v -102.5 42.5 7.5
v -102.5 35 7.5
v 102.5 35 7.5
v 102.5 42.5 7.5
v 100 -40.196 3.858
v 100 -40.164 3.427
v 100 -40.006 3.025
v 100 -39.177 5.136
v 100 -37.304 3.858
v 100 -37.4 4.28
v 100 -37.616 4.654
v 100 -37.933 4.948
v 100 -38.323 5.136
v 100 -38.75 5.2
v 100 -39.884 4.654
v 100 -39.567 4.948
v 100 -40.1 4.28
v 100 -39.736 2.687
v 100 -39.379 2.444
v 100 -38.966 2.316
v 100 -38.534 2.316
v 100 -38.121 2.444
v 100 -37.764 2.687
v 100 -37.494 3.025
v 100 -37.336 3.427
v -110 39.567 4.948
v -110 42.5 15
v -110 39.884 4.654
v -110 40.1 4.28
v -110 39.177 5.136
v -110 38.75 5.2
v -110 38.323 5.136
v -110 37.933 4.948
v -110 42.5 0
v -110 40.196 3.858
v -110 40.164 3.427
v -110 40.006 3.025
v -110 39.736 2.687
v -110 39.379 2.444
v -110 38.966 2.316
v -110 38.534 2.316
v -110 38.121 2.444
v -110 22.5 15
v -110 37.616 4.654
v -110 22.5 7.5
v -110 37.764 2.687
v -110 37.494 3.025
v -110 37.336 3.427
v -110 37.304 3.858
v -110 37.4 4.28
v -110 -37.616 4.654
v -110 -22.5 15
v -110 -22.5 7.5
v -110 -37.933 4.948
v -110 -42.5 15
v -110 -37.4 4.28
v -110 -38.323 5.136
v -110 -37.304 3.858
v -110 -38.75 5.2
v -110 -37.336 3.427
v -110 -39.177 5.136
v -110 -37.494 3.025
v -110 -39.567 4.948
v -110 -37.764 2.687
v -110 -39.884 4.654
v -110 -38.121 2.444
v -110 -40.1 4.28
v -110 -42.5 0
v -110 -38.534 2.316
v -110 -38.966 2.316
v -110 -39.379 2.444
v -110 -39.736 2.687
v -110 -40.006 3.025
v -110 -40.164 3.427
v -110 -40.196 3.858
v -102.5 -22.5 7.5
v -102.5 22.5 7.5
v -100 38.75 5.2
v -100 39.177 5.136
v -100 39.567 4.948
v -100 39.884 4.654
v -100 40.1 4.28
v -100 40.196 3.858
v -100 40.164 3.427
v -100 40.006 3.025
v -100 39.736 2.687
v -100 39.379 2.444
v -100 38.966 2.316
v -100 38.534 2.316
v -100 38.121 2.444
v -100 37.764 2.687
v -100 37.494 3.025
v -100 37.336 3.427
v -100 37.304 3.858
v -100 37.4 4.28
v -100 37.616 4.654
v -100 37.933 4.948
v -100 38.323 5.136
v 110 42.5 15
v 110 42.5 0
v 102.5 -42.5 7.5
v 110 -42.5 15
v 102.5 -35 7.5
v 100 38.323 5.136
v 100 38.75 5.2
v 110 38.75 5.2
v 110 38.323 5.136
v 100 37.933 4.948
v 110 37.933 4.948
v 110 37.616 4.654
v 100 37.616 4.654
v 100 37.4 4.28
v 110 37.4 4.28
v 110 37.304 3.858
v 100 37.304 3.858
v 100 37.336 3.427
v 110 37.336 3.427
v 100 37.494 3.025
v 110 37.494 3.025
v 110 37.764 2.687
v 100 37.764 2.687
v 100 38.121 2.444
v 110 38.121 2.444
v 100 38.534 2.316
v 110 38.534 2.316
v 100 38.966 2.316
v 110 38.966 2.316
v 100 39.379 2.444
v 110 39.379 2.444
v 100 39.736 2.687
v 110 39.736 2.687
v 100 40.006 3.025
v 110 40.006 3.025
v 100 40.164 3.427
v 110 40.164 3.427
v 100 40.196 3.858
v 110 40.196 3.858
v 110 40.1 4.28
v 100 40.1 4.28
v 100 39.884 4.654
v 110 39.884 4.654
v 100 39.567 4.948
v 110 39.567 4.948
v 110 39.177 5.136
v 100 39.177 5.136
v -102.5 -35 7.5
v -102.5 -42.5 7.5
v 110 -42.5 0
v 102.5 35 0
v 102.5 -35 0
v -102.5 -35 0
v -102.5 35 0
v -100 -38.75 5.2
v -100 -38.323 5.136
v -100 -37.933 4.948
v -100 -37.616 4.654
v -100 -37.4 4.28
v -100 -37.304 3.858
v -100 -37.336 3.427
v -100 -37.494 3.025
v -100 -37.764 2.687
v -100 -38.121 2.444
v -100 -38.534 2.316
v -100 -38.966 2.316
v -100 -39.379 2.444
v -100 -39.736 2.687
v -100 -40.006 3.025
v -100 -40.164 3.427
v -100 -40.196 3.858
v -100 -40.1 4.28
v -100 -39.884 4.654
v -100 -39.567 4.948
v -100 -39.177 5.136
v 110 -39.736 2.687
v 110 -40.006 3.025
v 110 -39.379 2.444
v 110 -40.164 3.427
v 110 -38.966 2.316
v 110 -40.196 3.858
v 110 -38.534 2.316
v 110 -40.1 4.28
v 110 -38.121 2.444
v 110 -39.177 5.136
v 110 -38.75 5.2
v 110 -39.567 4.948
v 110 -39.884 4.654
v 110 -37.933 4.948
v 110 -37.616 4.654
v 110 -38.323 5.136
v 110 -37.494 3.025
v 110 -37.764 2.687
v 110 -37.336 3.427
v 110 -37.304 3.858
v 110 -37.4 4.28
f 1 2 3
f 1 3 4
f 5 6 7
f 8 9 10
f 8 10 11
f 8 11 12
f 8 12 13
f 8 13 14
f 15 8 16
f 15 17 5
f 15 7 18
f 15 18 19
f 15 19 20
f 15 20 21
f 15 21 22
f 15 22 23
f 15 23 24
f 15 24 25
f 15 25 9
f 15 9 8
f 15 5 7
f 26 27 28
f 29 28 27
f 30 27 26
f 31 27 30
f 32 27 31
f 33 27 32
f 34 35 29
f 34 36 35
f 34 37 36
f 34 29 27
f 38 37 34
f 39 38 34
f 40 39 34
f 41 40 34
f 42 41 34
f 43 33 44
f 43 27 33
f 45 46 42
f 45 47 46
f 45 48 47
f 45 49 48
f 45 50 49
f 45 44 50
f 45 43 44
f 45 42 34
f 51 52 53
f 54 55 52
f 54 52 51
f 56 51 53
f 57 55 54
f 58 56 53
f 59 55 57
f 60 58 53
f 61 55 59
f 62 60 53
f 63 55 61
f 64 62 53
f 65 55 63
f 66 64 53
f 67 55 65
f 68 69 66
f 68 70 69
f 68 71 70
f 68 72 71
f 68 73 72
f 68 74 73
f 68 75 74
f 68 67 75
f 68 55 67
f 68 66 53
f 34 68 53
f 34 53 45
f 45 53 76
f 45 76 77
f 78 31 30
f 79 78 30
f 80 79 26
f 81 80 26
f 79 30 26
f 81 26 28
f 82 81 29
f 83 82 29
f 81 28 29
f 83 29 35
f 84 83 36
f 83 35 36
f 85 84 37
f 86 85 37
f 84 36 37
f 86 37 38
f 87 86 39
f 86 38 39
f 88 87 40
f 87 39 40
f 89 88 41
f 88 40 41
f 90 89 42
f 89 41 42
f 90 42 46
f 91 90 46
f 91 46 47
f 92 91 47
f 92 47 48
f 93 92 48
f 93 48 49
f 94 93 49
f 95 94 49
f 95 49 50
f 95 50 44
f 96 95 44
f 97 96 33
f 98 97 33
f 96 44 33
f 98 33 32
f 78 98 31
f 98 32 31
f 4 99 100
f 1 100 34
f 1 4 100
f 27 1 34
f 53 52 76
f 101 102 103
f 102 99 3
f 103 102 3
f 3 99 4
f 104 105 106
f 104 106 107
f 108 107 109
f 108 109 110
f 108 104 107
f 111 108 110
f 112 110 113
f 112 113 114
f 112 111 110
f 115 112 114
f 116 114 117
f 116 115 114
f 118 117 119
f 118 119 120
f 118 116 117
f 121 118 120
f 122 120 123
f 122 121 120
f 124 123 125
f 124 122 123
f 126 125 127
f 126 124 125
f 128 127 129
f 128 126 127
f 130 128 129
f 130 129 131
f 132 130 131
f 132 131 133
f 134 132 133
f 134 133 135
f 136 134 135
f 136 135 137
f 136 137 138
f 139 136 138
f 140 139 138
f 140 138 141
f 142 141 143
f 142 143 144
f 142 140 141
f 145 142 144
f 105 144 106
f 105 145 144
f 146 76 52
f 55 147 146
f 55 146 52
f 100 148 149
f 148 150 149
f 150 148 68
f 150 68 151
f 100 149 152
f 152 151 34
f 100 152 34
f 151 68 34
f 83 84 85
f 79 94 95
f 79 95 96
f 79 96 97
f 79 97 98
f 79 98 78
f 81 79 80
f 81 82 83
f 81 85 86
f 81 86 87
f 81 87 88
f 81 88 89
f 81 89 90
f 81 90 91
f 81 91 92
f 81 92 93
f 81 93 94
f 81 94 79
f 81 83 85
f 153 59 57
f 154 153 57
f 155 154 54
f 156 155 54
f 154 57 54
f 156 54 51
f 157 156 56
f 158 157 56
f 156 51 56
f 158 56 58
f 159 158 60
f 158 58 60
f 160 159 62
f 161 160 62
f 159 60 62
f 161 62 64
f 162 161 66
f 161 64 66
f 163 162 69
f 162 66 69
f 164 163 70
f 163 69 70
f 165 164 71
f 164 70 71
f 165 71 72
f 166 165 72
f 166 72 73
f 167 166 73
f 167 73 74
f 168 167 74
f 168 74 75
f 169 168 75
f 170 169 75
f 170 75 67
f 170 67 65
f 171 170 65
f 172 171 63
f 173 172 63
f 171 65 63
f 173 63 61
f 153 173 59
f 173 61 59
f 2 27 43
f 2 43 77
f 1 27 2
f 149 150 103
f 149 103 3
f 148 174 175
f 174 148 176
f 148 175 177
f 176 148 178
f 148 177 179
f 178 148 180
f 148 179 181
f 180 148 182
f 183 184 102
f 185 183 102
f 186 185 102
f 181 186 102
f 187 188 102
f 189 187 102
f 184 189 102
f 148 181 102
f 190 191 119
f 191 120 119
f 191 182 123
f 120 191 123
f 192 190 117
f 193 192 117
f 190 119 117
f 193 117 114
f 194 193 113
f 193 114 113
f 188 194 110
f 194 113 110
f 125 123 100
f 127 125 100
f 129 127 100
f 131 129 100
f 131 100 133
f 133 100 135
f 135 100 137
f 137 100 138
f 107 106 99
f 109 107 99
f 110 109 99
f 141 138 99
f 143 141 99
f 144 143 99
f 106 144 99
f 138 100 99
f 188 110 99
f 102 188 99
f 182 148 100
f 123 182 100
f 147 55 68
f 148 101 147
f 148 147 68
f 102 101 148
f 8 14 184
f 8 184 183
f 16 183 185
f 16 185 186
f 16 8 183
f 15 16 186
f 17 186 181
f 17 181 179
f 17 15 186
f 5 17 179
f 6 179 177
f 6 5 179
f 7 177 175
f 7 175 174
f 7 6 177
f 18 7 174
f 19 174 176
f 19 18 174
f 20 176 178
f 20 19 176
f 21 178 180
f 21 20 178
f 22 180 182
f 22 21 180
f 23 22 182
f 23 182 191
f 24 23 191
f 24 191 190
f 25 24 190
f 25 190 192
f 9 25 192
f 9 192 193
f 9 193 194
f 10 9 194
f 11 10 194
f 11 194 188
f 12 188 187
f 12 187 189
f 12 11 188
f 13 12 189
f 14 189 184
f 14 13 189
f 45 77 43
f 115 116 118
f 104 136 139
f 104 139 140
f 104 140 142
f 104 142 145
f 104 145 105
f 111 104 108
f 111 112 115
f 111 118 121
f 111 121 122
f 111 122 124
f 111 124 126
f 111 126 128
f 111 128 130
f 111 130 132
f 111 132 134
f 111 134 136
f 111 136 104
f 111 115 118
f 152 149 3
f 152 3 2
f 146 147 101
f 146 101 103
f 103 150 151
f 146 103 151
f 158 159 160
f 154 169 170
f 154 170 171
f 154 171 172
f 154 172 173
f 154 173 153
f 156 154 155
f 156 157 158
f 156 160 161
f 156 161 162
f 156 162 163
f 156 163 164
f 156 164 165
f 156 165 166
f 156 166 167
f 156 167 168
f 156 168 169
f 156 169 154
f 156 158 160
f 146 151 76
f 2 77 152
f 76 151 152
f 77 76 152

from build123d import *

# Parameters (mm, degrees)
SKETCH1_W           = 85
SKETCH1_H           = 220
SKETCH1_W_2         = 70
SKETCH1_H_2         = 205
BOSS_EXTRUDE1_DEPTH = 7.5
SKETCH2_R           = 1.45
CUT_EXTRUDE1_DEPTH  = 10
CUT_EXTRUDE2_START  = -10
SKETCH3_R           = 1.45
CUT_EXTRUDE2_DEPTH  = 10
BOSS_EXTRUDE3_DEPTH = 85
BOSS_EXTRUDE4_DEPTH = 20
BOSS_EXTRUDE5_DEPTH = 20


with BuildPart() as part:
    # Sketch1 → Boss-Extrude1 (new body)
    with BuildSketch(Plane(origin=(0, 0, 0), x_dir=(0, 1, 0), z_dir=(0, 0, 1))):
        Rectangle(SKETCH1_W, SKETCH1_H)
        Rectangle(SKETCH1_W_2, SKETCH1_H_2, mode=Mode.SUBTRACT)
    extrude(amount=BOSS_EXTRUDE1_DEPTH)

    # Sketch2 → Cut-Extrude1 (cut)
    with BuildSketch(Plane(origin=(-110, 0, 0), x_dir=(0, -1, 0), z_dir=(-1, 0, 0))):
        with Locations(Location((-38.75, 3.75, 0), (0, 0, 90))):
            Circle(SKETCH2_R)
        with Locations(Location((38.75, 3.75, 0), (0, 0, 90))):
            Circle(SKETCH2_R)
    extrude(amount=-CUT_EXTRUDE1_DEPTH, mode=Mode.SUBTRACT)

    # Sketch3 → Cut-Extrude2 (cut)
    with BuildSketch(Plane.YZ.offset(110).offset(CUT_EXTRUDE2_START)):
        with Locations(Location((-38.75, 3.75, 0), (0, 0, 90))):
            Circle(SKETCH3_R)
        with Locations(Location((38.75, 3.75, 0), (0, 0, 90))):
            Circle(SKETCH3_R)
    extrude(amount=CUT_EXTRUDE2_DEPTH, mode=Mode.SUBTRACT)

    # Sketch5 → Boss-Extrude3 (add, through all)
    with BuildSketch(Plane(origin=(0, 42.5, 0), x_dir=(-1, 0, 0), z_dir=(0, 1, 0))):
        Polygon((-110, 7.5), (-110, 15), (-102.5, 7.5), align=None)
    extrude(amount=-BOSS_EXTRUDE3_DEPTH)

    # Sketch5<4> → Boss-Extrude4 (add)
    with BuildSketch(Plane(origin=(0, 42.5, 0), x_dir=(-1, 0, 0), z_dir=(0, 1, 0))):
        Polygon((110, 7.5), (110, 15), (102.5, 7.5), align=None)
    extrude(amount=-BOSS_EXTRUDE4_DEPTH)

    # Sketch4 → Boss-Extrude5 (add)
    with BuildSketch(Plane.XZ.offset(42.5)):
        Polygon((-110, 15), (-110, 7.5), (-102.5, 7.5), align=None)
    extrude(amount=-BOSS_EXTRUDE5_DEPTH)


solid = part.part
